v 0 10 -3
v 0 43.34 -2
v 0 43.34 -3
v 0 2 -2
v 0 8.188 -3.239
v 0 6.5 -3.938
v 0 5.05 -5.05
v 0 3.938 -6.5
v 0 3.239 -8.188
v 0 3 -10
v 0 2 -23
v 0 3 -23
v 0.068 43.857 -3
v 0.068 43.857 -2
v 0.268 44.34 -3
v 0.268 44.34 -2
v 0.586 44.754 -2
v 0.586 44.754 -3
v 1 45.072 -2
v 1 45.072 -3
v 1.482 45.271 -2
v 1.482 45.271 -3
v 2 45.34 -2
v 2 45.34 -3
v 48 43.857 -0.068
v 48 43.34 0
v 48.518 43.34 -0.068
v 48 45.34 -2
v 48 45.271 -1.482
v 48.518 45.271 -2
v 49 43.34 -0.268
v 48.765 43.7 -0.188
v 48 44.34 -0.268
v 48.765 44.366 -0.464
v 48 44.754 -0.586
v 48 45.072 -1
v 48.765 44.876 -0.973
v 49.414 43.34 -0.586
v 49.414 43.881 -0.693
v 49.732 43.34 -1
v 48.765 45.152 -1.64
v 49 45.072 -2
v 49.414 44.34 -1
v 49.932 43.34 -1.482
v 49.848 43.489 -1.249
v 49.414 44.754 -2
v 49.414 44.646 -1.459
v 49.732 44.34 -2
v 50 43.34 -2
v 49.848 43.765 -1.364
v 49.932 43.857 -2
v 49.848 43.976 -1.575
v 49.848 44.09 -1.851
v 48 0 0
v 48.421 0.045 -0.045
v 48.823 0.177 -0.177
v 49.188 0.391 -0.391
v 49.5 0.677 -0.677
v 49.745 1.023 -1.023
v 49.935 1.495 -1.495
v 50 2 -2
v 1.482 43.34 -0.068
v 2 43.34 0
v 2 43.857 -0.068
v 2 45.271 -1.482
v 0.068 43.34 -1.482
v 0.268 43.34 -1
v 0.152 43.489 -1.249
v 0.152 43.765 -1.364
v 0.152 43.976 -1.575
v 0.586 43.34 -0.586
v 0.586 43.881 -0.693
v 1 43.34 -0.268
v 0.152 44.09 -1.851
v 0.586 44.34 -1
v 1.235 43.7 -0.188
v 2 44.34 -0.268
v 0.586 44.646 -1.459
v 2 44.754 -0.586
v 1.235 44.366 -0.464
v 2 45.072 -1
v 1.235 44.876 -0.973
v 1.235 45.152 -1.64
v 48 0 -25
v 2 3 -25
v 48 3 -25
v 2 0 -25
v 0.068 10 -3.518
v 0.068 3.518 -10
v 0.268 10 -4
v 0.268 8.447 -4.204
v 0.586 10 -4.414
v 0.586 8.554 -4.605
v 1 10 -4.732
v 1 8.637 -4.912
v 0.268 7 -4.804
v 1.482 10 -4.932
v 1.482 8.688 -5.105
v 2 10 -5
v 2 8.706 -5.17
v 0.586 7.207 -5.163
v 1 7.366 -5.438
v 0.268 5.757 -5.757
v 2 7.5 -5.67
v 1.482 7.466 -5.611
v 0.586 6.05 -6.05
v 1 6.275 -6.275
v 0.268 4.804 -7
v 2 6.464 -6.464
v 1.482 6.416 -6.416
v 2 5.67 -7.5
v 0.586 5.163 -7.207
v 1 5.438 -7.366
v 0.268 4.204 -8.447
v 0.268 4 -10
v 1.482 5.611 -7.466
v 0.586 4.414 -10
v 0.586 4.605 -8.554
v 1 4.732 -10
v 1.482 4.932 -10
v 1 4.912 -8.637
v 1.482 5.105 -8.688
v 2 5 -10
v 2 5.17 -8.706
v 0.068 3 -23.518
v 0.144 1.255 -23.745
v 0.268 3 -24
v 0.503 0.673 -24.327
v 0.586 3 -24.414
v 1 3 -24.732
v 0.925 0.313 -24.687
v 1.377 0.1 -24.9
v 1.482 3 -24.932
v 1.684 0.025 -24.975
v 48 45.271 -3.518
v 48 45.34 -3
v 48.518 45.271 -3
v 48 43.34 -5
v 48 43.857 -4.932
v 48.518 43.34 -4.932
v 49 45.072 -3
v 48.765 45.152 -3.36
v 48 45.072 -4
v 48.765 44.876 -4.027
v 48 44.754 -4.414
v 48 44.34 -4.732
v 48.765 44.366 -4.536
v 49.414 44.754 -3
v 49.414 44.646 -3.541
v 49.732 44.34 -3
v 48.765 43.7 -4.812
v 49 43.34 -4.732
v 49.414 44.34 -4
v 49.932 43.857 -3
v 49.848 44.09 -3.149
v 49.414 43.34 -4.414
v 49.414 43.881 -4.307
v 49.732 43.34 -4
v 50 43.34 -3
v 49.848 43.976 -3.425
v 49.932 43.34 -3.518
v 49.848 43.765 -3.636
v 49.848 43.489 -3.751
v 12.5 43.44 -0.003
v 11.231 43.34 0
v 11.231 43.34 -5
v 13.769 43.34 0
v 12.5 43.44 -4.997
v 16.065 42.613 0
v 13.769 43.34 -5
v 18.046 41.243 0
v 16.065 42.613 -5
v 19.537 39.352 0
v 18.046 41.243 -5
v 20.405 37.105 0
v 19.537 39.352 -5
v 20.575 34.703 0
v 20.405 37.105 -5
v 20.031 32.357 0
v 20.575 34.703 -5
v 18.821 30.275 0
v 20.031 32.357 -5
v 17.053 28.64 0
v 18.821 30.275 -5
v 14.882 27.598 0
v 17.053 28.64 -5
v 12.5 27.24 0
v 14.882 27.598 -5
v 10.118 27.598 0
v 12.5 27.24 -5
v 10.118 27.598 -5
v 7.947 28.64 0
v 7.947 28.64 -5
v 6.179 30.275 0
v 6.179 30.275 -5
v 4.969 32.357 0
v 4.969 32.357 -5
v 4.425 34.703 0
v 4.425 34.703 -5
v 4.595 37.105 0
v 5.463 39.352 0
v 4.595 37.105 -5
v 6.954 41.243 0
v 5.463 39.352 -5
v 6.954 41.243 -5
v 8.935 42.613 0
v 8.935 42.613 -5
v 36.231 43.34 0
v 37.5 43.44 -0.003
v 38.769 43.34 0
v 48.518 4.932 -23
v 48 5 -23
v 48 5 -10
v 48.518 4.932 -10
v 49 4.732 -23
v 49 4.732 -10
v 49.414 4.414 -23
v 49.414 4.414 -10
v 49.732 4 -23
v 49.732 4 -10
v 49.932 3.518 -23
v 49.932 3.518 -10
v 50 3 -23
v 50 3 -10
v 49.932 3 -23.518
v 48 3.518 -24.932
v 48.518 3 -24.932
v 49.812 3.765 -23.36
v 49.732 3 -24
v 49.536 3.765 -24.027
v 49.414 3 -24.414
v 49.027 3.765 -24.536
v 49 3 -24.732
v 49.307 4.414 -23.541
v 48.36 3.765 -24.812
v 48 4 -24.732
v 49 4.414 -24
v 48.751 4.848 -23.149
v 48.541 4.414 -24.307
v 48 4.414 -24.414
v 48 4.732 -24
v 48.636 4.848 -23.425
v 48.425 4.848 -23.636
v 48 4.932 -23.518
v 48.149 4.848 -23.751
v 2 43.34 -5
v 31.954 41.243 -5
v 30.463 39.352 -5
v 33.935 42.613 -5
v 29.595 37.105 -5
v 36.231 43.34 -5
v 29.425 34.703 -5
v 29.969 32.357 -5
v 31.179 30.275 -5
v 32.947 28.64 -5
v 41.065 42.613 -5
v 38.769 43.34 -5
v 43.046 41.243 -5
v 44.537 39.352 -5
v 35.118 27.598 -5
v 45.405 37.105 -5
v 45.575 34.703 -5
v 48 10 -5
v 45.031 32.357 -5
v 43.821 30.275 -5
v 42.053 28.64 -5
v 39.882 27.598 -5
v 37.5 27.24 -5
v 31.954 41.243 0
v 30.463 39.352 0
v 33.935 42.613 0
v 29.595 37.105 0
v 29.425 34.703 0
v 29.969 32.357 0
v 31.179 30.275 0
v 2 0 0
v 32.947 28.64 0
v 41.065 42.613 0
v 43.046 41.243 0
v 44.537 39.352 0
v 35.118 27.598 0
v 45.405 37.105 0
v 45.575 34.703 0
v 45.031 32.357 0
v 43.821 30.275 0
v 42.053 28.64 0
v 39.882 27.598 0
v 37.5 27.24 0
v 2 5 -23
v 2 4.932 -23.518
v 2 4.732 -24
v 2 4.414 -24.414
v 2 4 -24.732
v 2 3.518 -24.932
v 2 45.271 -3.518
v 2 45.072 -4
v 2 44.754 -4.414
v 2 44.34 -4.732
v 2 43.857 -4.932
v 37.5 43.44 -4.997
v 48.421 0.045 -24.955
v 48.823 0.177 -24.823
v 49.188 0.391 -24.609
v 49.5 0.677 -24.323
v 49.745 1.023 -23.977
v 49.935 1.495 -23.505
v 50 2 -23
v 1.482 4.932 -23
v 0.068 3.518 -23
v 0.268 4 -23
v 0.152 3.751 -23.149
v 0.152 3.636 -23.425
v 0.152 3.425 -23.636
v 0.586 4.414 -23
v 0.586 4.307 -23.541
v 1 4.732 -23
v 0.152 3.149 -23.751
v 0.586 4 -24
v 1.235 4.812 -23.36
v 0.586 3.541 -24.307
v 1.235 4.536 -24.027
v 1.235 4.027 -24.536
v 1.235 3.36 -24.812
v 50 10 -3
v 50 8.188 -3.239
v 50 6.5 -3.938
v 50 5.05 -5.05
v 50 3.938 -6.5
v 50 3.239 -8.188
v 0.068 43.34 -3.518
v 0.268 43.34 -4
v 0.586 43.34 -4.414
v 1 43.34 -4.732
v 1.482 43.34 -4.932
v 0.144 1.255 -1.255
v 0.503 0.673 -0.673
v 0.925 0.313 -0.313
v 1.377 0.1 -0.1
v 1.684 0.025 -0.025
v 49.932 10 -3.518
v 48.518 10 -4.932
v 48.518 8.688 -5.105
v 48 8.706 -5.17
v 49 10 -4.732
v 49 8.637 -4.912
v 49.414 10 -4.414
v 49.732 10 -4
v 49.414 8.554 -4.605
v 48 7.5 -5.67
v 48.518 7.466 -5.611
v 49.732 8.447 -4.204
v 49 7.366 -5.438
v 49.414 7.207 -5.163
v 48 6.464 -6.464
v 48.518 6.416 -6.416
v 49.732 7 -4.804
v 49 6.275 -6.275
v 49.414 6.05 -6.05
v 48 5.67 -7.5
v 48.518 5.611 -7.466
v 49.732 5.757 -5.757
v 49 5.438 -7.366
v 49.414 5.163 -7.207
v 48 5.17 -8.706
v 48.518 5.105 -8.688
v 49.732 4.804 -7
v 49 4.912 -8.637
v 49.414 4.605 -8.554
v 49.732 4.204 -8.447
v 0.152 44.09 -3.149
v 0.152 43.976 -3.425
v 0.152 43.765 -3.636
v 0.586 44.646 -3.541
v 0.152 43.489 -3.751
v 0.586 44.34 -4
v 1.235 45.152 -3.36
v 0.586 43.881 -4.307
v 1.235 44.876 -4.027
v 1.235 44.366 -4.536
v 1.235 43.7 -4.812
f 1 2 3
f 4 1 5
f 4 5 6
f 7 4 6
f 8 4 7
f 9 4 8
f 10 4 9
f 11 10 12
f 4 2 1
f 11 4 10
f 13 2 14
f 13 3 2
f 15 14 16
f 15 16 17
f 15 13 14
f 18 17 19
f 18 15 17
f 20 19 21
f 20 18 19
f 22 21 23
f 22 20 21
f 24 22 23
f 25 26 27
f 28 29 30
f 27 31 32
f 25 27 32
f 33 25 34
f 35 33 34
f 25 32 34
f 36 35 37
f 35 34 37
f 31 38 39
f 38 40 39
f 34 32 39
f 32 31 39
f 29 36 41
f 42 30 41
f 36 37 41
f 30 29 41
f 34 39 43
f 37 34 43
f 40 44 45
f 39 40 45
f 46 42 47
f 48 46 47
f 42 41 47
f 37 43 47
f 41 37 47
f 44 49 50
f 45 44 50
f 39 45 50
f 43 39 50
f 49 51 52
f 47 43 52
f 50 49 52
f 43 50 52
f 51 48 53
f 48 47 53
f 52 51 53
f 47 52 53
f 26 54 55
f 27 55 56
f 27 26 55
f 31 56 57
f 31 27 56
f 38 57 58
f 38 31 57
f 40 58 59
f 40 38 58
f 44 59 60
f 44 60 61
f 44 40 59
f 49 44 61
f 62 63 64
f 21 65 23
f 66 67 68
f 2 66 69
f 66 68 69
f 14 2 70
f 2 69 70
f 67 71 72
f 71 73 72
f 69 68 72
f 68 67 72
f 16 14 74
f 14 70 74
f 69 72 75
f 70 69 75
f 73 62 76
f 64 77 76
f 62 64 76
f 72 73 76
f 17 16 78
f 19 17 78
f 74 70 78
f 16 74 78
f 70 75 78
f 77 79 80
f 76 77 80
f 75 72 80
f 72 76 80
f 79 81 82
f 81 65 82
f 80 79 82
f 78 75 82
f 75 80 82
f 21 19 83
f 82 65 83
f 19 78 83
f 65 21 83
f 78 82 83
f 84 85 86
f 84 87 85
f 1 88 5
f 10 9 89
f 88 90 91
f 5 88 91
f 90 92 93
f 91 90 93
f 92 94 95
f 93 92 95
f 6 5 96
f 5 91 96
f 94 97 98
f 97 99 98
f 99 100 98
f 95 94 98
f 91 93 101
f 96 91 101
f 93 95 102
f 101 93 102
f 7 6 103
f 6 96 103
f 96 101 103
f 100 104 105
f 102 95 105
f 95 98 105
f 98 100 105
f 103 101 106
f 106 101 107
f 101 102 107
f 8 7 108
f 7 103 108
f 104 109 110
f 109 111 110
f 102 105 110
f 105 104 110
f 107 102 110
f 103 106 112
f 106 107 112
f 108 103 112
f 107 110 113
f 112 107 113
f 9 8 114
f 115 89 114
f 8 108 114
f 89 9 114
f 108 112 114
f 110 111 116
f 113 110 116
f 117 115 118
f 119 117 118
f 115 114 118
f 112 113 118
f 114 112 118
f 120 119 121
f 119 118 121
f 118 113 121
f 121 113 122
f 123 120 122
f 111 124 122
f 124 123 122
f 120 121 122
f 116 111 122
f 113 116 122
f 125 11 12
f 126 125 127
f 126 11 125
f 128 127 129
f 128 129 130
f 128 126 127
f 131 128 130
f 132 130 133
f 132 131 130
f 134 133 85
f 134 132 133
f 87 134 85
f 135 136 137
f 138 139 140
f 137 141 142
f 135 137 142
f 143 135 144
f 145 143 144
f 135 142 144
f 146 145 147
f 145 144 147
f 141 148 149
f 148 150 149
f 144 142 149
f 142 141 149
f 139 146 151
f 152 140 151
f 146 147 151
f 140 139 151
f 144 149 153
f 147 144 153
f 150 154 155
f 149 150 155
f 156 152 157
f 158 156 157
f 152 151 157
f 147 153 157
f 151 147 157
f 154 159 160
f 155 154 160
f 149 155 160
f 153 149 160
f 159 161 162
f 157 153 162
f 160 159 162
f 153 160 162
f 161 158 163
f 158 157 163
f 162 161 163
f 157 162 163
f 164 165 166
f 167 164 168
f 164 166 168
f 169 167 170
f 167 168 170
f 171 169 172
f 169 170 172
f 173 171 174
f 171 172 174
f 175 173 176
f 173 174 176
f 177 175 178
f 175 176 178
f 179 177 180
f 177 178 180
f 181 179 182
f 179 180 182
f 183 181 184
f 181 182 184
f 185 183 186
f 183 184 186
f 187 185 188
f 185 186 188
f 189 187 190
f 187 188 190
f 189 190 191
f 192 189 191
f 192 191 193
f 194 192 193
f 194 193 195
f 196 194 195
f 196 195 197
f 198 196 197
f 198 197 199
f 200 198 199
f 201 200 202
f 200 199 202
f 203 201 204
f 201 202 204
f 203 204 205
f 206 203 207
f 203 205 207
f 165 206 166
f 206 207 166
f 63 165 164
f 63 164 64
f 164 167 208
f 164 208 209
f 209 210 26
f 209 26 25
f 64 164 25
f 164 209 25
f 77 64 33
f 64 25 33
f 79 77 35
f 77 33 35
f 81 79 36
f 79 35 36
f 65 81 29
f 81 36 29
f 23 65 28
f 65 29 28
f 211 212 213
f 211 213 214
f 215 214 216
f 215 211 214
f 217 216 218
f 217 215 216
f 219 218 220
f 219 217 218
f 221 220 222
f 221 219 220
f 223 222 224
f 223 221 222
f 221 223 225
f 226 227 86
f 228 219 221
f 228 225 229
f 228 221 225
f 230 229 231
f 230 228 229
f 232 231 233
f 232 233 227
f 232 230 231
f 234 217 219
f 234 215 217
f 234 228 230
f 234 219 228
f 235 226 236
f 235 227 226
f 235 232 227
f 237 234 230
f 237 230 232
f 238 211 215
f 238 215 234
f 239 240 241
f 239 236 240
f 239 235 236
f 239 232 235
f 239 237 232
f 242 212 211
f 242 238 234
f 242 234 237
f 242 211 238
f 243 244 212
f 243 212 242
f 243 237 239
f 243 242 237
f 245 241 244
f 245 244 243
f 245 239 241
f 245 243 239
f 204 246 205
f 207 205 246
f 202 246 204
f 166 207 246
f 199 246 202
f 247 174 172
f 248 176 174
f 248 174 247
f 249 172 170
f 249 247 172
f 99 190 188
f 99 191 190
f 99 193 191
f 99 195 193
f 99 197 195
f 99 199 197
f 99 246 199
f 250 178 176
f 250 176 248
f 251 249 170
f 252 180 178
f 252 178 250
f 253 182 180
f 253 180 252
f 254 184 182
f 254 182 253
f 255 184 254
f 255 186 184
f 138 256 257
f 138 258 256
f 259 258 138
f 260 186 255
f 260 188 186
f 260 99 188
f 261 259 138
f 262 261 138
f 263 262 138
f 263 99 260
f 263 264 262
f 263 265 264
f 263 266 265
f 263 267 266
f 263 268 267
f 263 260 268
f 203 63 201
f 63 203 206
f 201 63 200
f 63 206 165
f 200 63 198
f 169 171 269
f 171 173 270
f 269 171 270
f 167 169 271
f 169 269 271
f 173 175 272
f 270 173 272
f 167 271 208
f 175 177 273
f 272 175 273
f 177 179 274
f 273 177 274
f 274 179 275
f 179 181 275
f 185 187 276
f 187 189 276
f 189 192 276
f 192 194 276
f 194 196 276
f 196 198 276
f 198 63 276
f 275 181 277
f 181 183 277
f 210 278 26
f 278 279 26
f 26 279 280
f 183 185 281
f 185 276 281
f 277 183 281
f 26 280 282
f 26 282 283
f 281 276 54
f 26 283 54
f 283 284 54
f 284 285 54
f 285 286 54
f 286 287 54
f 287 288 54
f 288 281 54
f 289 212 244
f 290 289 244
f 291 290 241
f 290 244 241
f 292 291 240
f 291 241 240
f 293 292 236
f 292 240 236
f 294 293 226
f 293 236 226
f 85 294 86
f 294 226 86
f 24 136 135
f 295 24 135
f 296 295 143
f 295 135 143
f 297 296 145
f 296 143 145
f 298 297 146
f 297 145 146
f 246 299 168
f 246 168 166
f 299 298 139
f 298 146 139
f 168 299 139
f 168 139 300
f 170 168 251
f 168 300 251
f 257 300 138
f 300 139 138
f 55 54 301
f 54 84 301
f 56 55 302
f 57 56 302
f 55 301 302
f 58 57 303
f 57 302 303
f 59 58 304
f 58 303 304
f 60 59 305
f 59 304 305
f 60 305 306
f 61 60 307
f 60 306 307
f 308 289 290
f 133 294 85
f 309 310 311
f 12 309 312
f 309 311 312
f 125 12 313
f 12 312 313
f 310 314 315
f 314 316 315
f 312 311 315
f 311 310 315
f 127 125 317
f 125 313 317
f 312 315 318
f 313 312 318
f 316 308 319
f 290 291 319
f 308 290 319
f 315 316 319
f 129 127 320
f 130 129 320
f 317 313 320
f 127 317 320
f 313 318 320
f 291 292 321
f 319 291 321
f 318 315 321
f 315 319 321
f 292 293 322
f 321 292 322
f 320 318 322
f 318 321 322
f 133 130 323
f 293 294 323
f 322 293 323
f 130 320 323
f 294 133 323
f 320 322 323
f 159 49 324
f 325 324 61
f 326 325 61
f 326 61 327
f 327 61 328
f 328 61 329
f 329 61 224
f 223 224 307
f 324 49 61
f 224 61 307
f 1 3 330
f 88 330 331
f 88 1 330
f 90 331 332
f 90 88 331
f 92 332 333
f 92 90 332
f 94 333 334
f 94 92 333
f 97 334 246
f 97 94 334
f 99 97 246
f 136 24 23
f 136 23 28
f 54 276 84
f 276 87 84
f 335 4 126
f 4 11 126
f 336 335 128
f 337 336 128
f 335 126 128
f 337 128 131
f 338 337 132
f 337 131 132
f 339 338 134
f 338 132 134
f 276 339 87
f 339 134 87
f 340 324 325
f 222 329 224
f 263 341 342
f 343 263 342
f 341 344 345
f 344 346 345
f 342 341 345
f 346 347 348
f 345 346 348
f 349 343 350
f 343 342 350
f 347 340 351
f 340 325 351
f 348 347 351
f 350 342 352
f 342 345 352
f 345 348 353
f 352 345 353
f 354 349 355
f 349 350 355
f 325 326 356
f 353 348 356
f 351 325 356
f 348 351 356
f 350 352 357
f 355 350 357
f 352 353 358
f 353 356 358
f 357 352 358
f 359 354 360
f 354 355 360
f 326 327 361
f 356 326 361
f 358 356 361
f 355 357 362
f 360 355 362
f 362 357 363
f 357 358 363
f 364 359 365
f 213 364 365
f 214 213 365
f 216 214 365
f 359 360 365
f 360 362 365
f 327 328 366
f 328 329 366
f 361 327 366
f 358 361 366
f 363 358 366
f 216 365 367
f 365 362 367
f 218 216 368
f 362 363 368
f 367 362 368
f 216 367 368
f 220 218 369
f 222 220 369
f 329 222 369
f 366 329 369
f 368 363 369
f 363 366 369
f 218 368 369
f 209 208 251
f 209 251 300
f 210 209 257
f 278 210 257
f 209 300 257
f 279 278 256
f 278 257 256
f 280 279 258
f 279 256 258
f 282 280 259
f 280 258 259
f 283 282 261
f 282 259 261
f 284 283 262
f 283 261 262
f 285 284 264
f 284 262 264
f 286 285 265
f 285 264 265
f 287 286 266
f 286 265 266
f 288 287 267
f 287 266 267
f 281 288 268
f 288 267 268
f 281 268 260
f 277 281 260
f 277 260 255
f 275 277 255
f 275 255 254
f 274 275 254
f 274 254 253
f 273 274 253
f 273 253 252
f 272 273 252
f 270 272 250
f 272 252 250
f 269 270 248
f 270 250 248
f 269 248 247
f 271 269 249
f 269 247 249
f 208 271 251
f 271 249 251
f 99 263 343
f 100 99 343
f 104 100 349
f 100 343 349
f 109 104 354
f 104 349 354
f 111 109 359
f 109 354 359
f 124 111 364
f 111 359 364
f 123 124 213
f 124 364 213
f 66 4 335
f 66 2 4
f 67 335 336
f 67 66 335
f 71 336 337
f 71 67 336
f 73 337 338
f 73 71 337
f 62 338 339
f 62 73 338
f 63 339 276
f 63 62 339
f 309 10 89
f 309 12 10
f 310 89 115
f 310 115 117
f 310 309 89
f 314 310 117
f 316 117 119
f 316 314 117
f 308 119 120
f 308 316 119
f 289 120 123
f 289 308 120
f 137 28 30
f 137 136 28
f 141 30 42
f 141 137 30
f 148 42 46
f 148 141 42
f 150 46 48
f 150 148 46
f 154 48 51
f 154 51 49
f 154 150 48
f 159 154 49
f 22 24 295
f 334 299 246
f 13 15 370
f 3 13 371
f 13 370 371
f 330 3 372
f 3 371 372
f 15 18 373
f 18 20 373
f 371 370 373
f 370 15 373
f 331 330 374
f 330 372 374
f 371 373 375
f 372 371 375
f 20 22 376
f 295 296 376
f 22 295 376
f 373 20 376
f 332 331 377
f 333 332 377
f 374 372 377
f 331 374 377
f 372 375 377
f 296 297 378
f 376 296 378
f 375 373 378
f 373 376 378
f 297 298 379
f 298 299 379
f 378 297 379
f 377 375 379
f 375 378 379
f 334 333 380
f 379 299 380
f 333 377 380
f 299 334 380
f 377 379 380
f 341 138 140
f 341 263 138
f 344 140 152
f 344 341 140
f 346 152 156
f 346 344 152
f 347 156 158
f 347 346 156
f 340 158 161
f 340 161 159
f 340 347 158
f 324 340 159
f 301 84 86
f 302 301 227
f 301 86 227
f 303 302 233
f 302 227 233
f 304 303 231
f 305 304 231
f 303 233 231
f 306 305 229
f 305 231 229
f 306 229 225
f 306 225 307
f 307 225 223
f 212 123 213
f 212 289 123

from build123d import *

# Parameters (mm, degrees)
SKETCH_2_W          = 50
SKETCH_2_H          = 25
EXTRUDE_4_DEPTH     = 5
SKETCH_7_W          = 50
SKETCH_7_H          = 5
EXTRUDE_5_DEPTH     = 40.339506062
FILLET_11_R         = 2
FILLET_12_R         = 2
FILLET_15_R         = 5
FILLET_17_R         = 2
FILLET_18_R         = 2
FILLET_19_R         = 2
SKETCH_8_R          = 8.1
CUT_EXTRUDE_4_DEPTH = 25


with BuildPart() as part:
    # 草图2 → 凸台-拉伸4 (new body)
    with BuildSketch(Plane(origin=(0, 0, 0), x_dir=(1, 0, 0), z_dir=(0, 1, 0))):
        with Locations((25, 12.5)):
            Rectangle(SKETCH_2_W, SKETCH_2_H)
    extrude(amount=EXTRUDE_4_DEPTH)

    # 草图7 → 凸台-拉伸5 (add)
    with BuildSketch(Plane(origin=(0, 5, 0), x_dir=(1, 0, 0), z_dir=(0, 1, 0))):
        with Locations((25, 2.5)):
            Rectangle(SKETCH_7_W, SKETCH_7_H)
    extrude(amount=EXTRUDE_5_DEPTH)

    # 圆角11
    fillet_11_edges = [part.edges().sort_by_distance(p)[0] for p in [
        (25, 45.339506062, 0),
    ]]
    fillet(fillet_11_edges, radius=FILLET_11_R)

    # 圆角12
    fillet_12_edges = [part.edges().sort_by_distance(p)[0] for p in [
        (25, 45.339506062, -5),
    ]]
    fillet(fillet_12_edges, radius=FILLET_12_R)

    # 圆角15
    fillet_15_edges = [part.edges().sort_by_distance(p)[0] for p in [
        (25, 5, -5),
    ]]
    fillet(fillet_15_edges, radius=FILLET_15_R)

    # 圆角17
    fillet_17_edges = [part.edges().sort_by_distance(p)[0] for p in [
        (50, 45.339506062, -2.5),
        (50, 21.669753031, 0),
        (50, 44.753719625, -0.585786438),
        (50, 26.669753031, -5),
        (50, 44.753719625, -4.414213562),
        (50, 5, -17.5),
        (50, 6.464466094, -6.464466094),
        (50, 0, -12.5),
        (50, 2.5, -25),
    ]]
    fillet(fillet_17_edges, radius=FILLET_17_R)

    # 圆角18
    # the kernel refuses this fillet: 2 mm, written as the material it takes off along each edge
    with BuildSketch(Plane(origin=(48, 3, -23), x_dir=(0, 0, -1), z_dir=(0, 1, 0))) as fillet_18_piece_1_section:
        Polygon((0, 0), (FILLET_18_R, 0), (FILLET_18_R, -FILLET_18_R), (0, -FILLET_18_R), align=None)
    fillet_18_piece_1 = extrude(amount=FILLET_18_R, mode=Mode.PRIVATE)
    fillet_18_piece_1 = fillet_18_piece_1 - Plane(origin=(48, 3, -23), x_dir=(-0.7071067811865475, 0, 0.7071067811865475), z_dir=(0, 1, 0)) * Sphere(FILLET_18_R, mode=Mode.PRIVATE)
    add(fillet_18_piece_1, mode=Mode.SUBTRACT)
    with BuildSketch(Plane(origin=(48, 5, -25), x_dir=(0, 0, 1), z_dir=(-1, 0, 0))) as fillet_18_piece_2:
        with BuildLine():
            CenterArc((FILLET_18_R, -FILLET_18_R), FILLET_18_R, 90, 90)
            Line((0, -FILLET_18_R), (0, 0))
            Line((0, 0), (FILLET_18_R, 0))
        make_face()
    extrude(amount=53, mode=Mode.SUBTRACT)

    # 圆角19
    fillet_19_edges = [part.edges().sort_by_distance(p)[0] for p in [
        (0, 21.669753031, 0),
        (0, 44.753719625, -0.585786438),
        (0, 45.339506062, -2.5),
        (0, 26.669753031, -5),
        (0, 44.753719625, -4.414213562),
        (0, 6.464466094, -6.464466094),
        (0, 0, -12.5),
        (0, 5, -16.5),
        (0, 1.5, -25),
        (0, 4.414213562, -24.414213562),
    ]]
    fillet(fillet_19_edges, radius=FILLET_19_R)

    # 草图8 → 切除-拉伸4 (cut)
    with BuildSketch(Plane(origin=(0, 0, -5), x_dir=(-1, 0, 0), z_dir=(0, 0, -1))):
        with Locations(Location((-37.5, 35.339506062, 0), (0, 0, 80.987548501))):
            Circle(SKETCH_8_R)
        with Locations(Location((-12.5, 35.339506062, 0), (0, 0, 80.987548501))):
            Circle(SKETCH_8_R)
    extrude(amount=-CUT_EXTRUDE_4_DEPTH, mode=Mode.SUBTRACT)


solid = part.part
